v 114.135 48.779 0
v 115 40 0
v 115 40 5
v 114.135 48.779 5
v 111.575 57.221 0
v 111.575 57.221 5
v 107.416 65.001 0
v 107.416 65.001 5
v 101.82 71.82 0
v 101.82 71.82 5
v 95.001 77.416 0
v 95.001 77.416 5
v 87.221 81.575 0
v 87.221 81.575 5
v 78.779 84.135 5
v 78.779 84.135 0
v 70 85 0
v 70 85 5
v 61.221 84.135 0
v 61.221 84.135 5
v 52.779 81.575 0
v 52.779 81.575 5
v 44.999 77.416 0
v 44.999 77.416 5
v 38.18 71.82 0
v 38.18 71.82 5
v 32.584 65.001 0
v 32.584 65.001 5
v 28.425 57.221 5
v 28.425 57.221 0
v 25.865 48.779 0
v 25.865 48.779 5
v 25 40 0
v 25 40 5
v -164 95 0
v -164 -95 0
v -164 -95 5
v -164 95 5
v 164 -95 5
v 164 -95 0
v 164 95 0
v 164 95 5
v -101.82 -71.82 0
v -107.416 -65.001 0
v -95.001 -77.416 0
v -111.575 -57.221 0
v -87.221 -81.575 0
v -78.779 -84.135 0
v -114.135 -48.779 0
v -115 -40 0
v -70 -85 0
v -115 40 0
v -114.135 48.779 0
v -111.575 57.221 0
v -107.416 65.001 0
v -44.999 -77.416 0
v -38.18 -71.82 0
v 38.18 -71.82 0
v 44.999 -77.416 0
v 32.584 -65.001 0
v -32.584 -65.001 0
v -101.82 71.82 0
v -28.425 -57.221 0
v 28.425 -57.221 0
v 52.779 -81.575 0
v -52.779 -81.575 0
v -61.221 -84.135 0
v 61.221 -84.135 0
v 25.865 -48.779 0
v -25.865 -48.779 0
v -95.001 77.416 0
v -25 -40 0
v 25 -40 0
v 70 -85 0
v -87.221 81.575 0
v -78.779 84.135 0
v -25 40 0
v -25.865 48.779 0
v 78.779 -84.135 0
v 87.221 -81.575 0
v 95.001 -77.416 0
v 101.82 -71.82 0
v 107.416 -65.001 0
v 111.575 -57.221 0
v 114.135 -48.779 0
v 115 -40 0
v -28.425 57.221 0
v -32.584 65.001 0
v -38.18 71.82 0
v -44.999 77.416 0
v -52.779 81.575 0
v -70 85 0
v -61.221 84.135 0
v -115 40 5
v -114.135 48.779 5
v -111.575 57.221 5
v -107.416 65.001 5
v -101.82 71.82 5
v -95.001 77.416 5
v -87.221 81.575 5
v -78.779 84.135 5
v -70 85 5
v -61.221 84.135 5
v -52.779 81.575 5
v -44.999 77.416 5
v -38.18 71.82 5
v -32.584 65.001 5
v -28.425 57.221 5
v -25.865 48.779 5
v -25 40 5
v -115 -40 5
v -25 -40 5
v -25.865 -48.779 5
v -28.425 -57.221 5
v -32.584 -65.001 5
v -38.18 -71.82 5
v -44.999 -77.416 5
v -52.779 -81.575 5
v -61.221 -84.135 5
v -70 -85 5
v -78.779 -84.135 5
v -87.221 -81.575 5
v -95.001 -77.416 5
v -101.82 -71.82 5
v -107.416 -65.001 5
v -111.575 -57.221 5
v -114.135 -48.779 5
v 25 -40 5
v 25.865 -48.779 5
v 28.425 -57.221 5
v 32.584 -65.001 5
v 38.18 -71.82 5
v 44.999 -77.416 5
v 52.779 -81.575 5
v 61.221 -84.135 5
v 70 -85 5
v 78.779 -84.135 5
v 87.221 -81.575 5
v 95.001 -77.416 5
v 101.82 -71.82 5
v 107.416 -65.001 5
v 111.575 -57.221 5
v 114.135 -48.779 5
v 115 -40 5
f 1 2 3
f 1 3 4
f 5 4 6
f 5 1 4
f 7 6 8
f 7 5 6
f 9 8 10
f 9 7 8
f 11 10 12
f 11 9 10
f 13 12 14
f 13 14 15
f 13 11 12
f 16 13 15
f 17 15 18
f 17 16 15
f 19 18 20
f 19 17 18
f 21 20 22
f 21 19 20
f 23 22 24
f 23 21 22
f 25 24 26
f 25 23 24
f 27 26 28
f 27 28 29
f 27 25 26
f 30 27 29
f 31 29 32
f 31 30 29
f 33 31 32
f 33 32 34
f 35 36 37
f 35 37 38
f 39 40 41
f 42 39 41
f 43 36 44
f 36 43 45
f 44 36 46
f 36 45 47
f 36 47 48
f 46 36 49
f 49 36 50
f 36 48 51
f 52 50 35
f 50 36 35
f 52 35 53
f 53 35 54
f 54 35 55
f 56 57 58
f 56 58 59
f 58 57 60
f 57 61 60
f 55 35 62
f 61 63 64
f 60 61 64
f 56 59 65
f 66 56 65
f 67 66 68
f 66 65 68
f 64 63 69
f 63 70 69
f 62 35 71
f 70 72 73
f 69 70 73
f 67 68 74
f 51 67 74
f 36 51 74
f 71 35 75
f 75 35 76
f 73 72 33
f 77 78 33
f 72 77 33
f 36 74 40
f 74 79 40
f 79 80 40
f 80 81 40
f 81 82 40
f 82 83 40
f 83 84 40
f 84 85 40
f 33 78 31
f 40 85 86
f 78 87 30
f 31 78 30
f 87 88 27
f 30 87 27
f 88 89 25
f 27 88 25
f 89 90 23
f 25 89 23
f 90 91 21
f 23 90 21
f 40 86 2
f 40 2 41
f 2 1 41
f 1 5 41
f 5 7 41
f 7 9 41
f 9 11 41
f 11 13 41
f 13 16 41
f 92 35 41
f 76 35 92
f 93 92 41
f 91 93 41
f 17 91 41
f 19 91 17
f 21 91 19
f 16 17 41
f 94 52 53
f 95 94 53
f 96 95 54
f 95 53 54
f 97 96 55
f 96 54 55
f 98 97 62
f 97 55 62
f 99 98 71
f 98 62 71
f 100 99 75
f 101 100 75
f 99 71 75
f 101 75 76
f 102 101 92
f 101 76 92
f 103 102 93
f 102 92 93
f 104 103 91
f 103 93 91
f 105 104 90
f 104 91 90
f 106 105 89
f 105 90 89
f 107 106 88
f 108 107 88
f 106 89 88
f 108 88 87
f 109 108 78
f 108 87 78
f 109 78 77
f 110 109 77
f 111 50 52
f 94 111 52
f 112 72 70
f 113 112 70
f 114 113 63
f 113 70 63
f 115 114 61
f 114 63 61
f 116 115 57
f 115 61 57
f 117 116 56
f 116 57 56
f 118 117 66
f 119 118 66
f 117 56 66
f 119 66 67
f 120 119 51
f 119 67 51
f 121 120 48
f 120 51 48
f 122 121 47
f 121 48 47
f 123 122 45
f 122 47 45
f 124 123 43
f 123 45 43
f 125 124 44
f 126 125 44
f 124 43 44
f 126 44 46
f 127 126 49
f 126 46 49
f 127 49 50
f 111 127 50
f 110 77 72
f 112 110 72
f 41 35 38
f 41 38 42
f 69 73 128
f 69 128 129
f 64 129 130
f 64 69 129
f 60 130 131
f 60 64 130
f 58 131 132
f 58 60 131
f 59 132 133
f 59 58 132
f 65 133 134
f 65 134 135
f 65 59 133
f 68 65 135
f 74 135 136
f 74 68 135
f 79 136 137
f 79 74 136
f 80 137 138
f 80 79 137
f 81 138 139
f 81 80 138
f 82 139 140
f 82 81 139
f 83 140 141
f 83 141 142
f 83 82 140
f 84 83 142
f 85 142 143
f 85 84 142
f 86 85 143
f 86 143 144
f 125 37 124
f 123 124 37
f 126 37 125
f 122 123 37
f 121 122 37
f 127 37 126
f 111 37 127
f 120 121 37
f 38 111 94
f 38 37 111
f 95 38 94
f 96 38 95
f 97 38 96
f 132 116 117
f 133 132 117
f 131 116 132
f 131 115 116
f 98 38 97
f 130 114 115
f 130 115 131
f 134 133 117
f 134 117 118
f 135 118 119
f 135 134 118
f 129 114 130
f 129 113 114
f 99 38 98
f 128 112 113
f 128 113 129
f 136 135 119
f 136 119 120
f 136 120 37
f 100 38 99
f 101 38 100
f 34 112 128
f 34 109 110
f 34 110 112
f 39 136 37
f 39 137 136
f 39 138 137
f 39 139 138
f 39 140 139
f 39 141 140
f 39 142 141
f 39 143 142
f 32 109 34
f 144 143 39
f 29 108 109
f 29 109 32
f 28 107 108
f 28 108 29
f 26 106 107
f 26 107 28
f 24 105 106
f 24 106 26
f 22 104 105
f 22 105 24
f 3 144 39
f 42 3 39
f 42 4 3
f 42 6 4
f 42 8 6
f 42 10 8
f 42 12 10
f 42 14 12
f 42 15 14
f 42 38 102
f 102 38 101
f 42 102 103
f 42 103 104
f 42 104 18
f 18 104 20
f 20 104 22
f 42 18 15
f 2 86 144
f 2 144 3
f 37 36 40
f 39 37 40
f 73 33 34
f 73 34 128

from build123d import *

# Parameters (mm, degrees)
SKETCH_1_W      = 328
SKETCH_1_H      = 190
EXTRUDE_1_DEPTH = 5


with BuildPart() as part:
    # Эскиз1 → Бобышка-Вытянуть1 (new body)
    with BuildSketch(Plane.XY):
        Rectangle(SKETCH_1_W, SKETCH_1_H)
        with BuildLine():
            Line((-25, 40), (-25, -40))
            ThreePointArc((-25, -40), (-70, -85), (-115, -40))
            Line((-115, -40), (-115, 40))
            ThreePointArc((-115, 40), (-70, 85), (-25, 40))
        make_face(mode=Mode.SUBTRACT)
        with BuildLine():
            Line((25, 40), (25, -40))
            ThreePointArc((25, -40), (70, -85), (115, -40))
            Line((115, -40), (115, 40))
            ThreePointArc((115, 40), (70, 85), (25, 40))
        make_face(mode=Mode.SUBTRACT)
    extrude(amount=EXTRUDE_1_DEPTH)


solid = part.part
